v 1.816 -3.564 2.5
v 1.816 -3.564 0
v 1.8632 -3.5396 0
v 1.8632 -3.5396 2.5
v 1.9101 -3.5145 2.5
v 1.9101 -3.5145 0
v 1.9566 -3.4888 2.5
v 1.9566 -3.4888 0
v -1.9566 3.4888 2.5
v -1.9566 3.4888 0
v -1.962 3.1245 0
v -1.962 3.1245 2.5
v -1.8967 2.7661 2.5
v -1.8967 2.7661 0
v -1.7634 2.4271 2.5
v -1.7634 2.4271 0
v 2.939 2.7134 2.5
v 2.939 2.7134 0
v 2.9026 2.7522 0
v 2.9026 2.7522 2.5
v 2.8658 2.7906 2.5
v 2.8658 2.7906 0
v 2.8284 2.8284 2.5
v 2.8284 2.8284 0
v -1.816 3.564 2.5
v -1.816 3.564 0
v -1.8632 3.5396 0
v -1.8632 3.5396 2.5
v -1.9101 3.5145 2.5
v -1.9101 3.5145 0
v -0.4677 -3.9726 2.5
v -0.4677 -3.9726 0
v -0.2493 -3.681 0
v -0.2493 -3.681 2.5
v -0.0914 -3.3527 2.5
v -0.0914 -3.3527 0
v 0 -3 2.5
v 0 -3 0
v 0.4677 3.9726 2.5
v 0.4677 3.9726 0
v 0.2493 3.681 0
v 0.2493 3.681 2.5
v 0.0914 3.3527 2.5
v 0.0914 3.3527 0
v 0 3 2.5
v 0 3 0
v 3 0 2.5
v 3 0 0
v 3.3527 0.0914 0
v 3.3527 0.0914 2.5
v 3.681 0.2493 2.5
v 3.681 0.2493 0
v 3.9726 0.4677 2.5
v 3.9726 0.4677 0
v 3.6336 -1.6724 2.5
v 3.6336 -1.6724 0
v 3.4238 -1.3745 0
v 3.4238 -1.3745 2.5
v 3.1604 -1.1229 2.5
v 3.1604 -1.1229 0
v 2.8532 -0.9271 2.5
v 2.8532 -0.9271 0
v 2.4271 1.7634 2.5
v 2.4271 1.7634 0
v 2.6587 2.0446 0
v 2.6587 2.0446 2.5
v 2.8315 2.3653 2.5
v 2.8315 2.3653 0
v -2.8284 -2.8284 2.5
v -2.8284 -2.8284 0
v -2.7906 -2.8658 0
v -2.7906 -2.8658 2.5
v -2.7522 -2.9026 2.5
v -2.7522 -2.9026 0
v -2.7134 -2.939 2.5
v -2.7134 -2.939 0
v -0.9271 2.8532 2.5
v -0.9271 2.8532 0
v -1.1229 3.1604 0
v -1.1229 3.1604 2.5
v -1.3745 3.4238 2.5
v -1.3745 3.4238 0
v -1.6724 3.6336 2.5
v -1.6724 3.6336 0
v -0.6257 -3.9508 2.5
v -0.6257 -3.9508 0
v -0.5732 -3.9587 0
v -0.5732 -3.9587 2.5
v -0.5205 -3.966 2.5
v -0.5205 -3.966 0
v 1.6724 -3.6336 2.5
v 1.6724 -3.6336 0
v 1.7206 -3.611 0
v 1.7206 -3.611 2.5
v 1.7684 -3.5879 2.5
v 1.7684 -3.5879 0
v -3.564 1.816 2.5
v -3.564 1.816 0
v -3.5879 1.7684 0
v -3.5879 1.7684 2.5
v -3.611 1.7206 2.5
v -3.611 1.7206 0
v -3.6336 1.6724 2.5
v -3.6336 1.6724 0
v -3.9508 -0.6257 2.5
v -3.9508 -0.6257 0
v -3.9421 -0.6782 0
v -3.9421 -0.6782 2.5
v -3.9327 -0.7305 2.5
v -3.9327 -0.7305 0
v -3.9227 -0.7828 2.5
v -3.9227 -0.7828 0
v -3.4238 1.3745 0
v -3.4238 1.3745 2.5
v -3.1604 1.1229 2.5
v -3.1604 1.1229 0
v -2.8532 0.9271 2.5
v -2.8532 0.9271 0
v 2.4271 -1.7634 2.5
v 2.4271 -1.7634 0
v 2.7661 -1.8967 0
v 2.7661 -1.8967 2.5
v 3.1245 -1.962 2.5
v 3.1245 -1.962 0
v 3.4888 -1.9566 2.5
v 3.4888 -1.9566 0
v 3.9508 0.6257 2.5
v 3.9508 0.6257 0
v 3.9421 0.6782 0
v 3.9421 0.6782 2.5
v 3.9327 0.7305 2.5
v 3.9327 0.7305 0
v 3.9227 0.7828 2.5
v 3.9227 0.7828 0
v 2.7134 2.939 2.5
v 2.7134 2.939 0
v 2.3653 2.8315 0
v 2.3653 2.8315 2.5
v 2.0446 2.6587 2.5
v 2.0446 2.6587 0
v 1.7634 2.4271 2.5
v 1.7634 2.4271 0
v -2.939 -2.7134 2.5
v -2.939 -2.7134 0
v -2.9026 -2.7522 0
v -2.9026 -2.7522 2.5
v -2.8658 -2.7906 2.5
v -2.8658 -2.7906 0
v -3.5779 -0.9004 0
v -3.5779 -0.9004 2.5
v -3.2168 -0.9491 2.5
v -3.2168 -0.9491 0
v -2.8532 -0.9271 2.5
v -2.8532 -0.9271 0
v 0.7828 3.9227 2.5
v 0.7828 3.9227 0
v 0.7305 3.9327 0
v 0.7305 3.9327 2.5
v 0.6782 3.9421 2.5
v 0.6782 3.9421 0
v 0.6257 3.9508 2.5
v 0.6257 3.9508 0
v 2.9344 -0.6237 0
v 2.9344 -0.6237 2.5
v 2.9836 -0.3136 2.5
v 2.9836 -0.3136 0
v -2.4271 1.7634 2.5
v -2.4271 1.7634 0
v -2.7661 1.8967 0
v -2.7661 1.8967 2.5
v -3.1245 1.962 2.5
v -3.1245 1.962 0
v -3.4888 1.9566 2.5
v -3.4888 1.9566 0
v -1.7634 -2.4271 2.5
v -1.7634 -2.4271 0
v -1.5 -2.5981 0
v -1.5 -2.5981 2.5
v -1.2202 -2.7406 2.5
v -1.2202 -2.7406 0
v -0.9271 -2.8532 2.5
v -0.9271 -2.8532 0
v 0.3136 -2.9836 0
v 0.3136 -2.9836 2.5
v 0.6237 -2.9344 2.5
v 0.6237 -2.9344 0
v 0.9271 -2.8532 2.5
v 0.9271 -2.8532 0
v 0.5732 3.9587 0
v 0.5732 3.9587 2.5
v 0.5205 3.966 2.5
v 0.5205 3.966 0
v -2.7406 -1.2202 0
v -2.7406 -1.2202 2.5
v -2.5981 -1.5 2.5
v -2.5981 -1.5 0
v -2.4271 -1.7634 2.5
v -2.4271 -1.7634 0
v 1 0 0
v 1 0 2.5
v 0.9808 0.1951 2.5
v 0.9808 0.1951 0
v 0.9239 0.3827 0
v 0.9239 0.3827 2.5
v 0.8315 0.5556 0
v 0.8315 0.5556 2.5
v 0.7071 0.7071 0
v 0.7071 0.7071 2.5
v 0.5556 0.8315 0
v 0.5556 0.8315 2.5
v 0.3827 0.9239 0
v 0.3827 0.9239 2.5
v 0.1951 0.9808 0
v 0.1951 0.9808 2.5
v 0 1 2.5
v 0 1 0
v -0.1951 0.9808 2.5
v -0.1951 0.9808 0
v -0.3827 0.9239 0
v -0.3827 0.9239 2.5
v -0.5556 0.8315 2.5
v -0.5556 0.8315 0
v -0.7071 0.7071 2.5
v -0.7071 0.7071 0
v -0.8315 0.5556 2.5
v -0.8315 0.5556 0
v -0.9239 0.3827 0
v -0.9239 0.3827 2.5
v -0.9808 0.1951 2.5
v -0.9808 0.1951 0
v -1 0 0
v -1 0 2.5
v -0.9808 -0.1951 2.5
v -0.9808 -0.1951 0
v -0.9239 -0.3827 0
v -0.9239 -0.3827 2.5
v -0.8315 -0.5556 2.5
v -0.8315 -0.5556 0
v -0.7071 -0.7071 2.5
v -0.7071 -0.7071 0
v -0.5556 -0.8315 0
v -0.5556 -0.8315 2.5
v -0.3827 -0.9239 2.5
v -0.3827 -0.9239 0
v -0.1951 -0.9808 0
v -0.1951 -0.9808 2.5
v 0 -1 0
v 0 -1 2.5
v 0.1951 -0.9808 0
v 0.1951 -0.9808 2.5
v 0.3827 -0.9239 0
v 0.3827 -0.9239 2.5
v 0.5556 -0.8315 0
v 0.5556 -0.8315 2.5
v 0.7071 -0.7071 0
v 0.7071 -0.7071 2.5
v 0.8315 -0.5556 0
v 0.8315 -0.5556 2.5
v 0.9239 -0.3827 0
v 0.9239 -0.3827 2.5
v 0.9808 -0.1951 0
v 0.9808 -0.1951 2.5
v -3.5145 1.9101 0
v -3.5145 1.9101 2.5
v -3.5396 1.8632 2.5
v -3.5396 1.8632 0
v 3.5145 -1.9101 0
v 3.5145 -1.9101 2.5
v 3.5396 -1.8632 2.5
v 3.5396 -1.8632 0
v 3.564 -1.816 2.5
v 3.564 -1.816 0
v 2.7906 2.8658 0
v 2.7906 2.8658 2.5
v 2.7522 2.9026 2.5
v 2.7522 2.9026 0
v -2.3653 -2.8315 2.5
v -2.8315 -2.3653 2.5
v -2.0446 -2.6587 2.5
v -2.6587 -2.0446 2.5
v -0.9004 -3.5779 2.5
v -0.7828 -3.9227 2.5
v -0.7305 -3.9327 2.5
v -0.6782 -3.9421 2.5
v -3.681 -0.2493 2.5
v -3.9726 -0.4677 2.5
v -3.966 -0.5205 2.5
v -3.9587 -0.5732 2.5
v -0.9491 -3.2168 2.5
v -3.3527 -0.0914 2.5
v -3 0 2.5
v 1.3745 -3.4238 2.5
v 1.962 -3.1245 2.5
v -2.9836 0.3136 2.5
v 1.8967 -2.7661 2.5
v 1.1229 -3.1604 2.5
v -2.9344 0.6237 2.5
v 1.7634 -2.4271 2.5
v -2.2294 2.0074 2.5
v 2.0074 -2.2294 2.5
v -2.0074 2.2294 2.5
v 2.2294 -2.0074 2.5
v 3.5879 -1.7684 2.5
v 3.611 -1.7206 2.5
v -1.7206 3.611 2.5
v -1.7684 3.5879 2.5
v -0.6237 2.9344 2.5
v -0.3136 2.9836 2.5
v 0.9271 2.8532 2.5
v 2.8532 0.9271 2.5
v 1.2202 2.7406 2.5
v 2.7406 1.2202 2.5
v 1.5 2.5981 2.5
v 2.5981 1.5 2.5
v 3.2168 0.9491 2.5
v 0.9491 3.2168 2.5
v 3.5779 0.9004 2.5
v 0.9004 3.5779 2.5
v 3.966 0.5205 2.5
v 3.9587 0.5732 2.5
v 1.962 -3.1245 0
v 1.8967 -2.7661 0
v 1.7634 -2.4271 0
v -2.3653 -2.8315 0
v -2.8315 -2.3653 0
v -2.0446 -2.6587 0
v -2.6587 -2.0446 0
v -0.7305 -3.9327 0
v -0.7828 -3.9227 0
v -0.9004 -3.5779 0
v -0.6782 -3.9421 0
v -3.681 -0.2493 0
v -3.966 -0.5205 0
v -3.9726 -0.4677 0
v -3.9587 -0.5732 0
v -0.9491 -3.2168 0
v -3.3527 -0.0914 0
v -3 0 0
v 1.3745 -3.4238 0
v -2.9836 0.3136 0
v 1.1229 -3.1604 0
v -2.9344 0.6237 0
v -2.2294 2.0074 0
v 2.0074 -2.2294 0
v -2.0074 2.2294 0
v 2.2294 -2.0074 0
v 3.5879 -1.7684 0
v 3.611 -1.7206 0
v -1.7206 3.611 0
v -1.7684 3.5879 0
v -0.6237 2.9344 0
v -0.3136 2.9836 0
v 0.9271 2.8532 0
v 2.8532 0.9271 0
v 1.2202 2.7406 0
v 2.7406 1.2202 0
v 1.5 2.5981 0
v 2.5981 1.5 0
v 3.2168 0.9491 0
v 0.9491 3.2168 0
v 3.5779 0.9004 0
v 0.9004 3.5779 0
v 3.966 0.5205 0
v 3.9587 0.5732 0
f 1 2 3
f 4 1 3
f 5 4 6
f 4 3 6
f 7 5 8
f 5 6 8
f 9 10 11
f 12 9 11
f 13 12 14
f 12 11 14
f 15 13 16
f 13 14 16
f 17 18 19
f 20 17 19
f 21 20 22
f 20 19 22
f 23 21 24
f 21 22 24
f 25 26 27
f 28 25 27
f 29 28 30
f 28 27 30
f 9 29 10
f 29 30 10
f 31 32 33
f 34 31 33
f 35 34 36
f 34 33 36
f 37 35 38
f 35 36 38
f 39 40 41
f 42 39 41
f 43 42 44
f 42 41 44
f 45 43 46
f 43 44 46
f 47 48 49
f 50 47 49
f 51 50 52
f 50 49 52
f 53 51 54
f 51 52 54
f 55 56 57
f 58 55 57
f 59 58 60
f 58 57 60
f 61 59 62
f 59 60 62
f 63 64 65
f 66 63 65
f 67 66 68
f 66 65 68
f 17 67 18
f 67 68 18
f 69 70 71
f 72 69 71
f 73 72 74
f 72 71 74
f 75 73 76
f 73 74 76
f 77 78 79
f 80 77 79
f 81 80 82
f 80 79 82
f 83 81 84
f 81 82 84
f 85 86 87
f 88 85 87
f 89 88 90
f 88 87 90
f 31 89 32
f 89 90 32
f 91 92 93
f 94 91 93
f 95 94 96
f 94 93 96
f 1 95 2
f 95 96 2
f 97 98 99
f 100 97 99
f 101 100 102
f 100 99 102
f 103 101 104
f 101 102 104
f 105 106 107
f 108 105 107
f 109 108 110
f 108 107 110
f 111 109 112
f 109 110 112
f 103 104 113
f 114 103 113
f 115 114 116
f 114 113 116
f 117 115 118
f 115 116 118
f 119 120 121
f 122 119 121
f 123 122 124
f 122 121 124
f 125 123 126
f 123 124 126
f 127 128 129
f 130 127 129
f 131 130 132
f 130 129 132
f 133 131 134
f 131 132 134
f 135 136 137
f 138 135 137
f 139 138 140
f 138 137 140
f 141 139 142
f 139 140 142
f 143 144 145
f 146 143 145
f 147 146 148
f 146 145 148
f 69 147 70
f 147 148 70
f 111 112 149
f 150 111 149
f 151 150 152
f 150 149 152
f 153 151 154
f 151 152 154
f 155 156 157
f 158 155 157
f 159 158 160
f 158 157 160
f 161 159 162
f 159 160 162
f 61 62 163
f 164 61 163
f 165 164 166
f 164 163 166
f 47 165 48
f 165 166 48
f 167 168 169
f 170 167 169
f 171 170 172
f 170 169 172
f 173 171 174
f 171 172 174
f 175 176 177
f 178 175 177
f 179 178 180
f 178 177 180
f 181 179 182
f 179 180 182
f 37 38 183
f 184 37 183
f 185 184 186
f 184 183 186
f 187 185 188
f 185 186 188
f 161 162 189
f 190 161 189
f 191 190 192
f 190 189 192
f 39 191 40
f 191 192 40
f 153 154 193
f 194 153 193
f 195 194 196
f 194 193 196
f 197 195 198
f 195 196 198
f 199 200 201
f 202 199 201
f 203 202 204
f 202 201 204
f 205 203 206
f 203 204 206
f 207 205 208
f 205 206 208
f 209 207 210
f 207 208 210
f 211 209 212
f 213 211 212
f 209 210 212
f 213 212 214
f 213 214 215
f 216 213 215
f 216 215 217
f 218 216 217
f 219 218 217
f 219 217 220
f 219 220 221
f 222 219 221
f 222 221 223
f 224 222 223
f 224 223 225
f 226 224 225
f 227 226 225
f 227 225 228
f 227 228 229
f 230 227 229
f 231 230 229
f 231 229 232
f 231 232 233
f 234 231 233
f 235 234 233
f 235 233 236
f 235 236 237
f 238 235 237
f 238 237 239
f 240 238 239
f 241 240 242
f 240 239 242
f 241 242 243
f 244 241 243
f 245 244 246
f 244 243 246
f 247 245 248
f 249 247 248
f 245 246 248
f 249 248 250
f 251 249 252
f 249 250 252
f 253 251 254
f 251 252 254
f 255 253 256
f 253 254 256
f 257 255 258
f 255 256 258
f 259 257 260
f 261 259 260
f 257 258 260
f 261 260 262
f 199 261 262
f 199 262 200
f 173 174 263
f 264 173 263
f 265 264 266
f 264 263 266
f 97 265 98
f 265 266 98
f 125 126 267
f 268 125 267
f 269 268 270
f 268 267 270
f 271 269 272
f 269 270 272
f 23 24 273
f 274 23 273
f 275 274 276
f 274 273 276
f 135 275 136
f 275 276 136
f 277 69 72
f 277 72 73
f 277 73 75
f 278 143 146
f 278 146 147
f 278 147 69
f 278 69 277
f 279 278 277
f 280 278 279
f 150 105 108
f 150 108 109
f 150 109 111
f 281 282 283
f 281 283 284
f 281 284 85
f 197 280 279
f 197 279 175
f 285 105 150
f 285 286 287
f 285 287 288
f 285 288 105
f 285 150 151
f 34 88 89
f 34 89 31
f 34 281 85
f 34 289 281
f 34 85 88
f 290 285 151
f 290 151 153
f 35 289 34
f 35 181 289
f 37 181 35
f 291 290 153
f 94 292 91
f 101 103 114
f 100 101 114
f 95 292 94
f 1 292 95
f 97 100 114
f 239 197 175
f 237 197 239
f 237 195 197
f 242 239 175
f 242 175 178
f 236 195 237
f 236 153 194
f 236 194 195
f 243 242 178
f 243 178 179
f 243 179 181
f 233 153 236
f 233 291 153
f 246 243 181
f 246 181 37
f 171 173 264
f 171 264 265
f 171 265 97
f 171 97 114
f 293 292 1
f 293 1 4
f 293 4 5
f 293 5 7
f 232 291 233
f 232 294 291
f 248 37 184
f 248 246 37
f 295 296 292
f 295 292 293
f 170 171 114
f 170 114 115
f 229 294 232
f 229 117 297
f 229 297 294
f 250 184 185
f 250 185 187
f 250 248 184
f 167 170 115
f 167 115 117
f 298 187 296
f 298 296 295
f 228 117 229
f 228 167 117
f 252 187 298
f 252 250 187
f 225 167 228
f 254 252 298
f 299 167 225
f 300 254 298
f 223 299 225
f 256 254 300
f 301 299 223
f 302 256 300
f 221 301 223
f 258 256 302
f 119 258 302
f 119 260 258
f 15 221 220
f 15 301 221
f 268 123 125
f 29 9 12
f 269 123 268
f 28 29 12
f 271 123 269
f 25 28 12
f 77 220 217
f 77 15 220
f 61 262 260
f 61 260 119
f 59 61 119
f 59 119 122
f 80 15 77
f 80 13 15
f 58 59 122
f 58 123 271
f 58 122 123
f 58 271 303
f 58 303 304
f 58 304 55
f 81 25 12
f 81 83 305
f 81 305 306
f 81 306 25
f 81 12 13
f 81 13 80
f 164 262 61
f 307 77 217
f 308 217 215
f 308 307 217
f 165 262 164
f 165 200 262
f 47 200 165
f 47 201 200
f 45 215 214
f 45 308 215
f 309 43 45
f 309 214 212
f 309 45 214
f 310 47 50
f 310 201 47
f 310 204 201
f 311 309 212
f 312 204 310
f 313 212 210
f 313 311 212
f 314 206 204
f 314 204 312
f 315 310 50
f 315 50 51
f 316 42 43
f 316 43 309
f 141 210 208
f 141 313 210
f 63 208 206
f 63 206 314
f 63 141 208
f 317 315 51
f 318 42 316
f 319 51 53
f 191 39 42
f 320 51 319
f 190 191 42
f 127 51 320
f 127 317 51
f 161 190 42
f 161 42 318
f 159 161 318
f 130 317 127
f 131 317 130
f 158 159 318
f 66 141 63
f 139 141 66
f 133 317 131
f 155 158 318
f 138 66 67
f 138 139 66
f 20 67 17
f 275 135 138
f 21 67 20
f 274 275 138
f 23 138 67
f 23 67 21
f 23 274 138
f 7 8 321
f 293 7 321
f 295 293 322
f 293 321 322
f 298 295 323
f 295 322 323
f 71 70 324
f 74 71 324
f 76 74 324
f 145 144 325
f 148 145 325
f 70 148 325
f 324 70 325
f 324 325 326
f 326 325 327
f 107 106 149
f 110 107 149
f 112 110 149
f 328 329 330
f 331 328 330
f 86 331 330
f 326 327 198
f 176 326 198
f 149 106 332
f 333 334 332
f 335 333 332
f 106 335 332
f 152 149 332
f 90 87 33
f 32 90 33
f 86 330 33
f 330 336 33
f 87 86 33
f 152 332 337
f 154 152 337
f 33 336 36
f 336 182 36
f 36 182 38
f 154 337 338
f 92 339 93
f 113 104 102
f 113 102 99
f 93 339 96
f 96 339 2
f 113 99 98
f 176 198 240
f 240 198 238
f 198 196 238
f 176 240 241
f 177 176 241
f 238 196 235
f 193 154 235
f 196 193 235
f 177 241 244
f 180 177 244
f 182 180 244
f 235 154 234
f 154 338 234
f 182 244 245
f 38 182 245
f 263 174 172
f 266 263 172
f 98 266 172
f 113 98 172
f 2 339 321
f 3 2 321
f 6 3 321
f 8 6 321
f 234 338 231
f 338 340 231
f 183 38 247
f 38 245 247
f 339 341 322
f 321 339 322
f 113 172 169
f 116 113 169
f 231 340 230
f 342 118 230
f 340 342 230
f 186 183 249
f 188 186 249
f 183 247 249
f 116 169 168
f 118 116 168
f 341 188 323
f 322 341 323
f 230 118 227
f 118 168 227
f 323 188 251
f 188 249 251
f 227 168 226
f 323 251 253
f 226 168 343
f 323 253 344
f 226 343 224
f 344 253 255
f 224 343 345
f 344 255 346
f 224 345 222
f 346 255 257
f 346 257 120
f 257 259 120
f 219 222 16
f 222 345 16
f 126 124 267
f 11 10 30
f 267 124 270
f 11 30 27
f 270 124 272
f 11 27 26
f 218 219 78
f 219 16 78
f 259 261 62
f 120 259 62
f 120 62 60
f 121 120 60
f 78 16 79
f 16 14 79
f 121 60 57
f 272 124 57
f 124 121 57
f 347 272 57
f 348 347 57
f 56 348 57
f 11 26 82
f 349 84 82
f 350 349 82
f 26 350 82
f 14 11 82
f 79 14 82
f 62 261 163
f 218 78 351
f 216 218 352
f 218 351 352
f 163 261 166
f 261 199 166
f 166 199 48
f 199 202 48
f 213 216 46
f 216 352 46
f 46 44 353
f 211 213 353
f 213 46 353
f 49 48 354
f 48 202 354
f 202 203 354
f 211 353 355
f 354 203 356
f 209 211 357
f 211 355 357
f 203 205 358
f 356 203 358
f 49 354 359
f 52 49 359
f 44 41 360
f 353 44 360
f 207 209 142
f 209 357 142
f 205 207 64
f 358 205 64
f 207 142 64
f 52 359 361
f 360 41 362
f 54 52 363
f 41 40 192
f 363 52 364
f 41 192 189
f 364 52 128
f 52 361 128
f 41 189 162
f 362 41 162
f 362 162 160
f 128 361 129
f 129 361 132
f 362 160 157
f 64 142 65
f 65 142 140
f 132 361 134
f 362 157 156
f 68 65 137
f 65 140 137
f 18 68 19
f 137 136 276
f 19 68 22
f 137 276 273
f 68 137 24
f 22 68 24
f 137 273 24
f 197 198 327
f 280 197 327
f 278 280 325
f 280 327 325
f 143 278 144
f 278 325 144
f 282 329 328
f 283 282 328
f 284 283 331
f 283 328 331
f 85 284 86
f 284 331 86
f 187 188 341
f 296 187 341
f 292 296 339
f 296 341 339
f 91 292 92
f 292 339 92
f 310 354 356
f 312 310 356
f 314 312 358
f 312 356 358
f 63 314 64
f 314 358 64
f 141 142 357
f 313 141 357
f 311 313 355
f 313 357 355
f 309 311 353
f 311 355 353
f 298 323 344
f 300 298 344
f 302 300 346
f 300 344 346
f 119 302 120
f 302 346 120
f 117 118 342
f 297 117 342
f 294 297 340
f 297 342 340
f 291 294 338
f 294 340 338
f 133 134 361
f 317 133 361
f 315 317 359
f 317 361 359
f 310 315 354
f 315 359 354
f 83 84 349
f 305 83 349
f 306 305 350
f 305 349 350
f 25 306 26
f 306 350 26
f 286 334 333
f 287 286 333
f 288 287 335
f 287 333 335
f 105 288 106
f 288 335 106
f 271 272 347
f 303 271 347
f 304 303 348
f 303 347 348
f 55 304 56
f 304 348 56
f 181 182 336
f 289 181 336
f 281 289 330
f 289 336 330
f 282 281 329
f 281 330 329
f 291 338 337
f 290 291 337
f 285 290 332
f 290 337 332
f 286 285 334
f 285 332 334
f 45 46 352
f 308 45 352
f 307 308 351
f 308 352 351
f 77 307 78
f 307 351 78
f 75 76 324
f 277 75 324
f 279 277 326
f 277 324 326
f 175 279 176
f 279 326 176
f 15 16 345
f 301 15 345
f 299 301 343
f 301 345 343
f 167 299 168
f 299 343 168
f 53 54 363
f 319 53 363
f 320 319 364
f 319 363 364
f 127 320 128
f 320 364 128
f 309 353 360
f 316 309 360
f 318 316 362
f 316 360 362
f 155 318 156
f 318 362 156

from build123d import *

# Parameters (mm, degrees)
F1_DEPTH = 2.5
F2_R     = 1
F3_DEPTH = 2.501


with BuildPart() as f1:
    # F0 (on Top) → F1 (new body)
    with BuildSketch(Plane.XY):
        with BuildLine():
            ThreePointArc((2.85317, 0.927051), (2.67302, 1.361971), (2.427051, 1.763356))
            ThreePointArc((2.427051, 1.763356), (2.752898, 2.200719), (2.938951, 2.713405))
            ThreePointArc((2.938951, 2.713405), (2.884263, 2.771467), (2.828427, 2.828427))
            ThreePointArc((2.828427, 2.828427), (2.771467, 2.884263), (2.713405, 2.938951))
            ThreePointArc((2.713405, 2.938951), (2.200719, 2.752898), (1.763356, 2.427051))
            ThreePointArc((1.763356, 2.427051), (1.361971, 2.67302), (0.927051, 2.85317))
            ThreePointArc((0.927051, 2.85317), (0.933592, 3.398532), (0.782762, 3.922663))
            ThreePointArc((0.782762, 3.922663), (0.70439, 3.937491), (0.625738, 3.950753))
            ThreePointArc((0.625738, 3.950753), (0.546837, 3.962445), (0.467718, 3.972561))
            ThreePointArc((0.467718, 3.972561), (0.162306, 3.520692), (0, 3))
            ThreePointArc((0, 3), (-0.469303, 2.963065), (-0.927051, 2.85317))
            ThreePointArc((-0.927051, 2.85317), (-1.242315, 3.298221), (-1.672415, 3.633597))
            ThreePointArc((-1.672415, 3.633597), (-1.744535, 3.599527), (-1.815962, 3.564026))
            ThreePointArc((-1.815962, 3.564026), (-1.886666, 3.527108), (-1.956621, 3.488787))
            ThreePointArc((-1.956621, 3.488787), (-1.938103, 2.9437), (-1.763356, 2.427051))
            ThreePointArc((-1.763356, 2.427051), (-2.12132, 2.12132), (-2.427051, 1.763356))
            ThreePointArc((-2.427051, 1.763356), (-2.9437, 1.938103), (-3.488787, 1.956621))
            ThreePointArc((-3.488787, 1.956621), (-3.527108, 1.886666), (-3.564026, 1.815962))
            ThreePointArc((-3.564026, 1.815962), (-3.599527, 1.744535), (-3.633597, 1.672415))
            ThreePointArc((-3.633597, 1.672415), (-3.298221, 1.242315), (-2.85317, 0.927051))
            ThreePointArc((-2.85317, 0.927051), (-2.963065, 0.469303), (-3, 0))
            ThreePointArc((-3, 0), (-3.520692, -0.162306), (-3.972561, -0.467718))
            ThreePointArc((-3.972561, -0.467718), (-3.962445, -0.546837), (-3.950753, -0.625738))
            ThreePointArc((-3.950753, -0.625738), (-3.937491, -0.70439), (-3.922663, -0.782762))
            ThreePointArc((-3.922663, -0.782762), (-3.398532, -0.933592), (-2.85317, -0.927051))
            ThreePointArc((-2.85317, -0.927051), (-2.67302, -1.361971), (-2.427051, -1.763356))
            ThreePointArc((-2.427051, -1.763356), (-2.752898, -2.200719), (-2.938951, -2.713405))
            ThreePointArc((-2.938951, -2.713405), (-2.884263, -2.771467), (-2.828427, -2.828427))
            ThreePointArc((-2.828427, -2.828427), (-2.771467, -2.884263), (-2.713405, -2.938951))
            ThreePointArc((-2.713405, -2.938951), (-2.200719, -2.752898), (-1.763356, -2.427051))
            ThreePointArc((-1.763356, -2.427051), (-1.361971, -2.67302), (-0.927051, -2.85317))
            ThreePointArc((-0.927051, -2.85317), (-0.933592, -3.398532), (-0.782762, -3.922663))
            ThreePointArc((-0.782762, -3.922663), (-0.70439, -3.937491), (-0.625738, -3.950753))
            ThreePointArc((-0.625738, -3.950753), (-0.546837, -3.962445), (-0.467718, -3.972561))
            ThreePointArc((-0.467718, -3.972561), (-0.162306, -3.520692), (0, -3))
            ThreePointArc((0, -3), (0.469303, -2.963065), (0.927051, -2.85317))
            ThreePointArc((0.927051, -2.85317), (1.242315, -3.298221), (1.672415, -3.633597))
            ThreePointArc((1.672415, -3.633597), (1.744535, -3.599527), (1.815962, -3.564026))
            ThreePointArc((1.815962, -3.564026), (1.886666, -3.527108), (1.956621, -3.488787))
            ThreePointArc((1.956621, -3.488787), (1.938103, -2.9437), (1.763356, -2.427051))
            ThreePointArc((1.763356, -2.427051), (2.12132, -2.12132), (2.427051, -1.763356))
            ThreePointArc((2.427051, -1.763356), (2.9437, -1.938103), (3.488787, -1.956621))
            ThreePointArc((3.488787, -1.956621), (3.527108, -1.886666), (3.564026, -1.815962))
            ThreePointArc((3.564026, -1.815962), (3.599527, -1.744535), (3.633597, -1.672415))
            ThreePointArc((3.633597, -1.672415), (3.298221, -1.242315), (2.85317, -0.927051))
            ThreePointArc((2.85317, -0.927051), (2.963065, -0.469303), (3, 0))
            ThreePointArc((3, 0), (3.520692, 0.162306), (3.972561, 0.467718))
            ThreePointArc((3.972561, 0.467718), (3.962445, 0.546837), (3.950753, 0.625738))
            ThreePointArc((3.950753, 0.625738), (3.937491, 0.70439), (3.922663, 0.782762))
            ThreePointArc((3.922663, 0.782762), (3.398532, 0.933592), (2.85317, 0.927051))
        make_face()
    extrude(amount=F1_DEPTH)

    # F2 (on face) → F3 (cut, through all)
    with BuildSketch(Plane.XY.offset(2.5)):
        Circle(F2_R)
    extrude(amount=-F3_DEPTH, mode=Mode.SUBTRACT)


solid = f1.part
